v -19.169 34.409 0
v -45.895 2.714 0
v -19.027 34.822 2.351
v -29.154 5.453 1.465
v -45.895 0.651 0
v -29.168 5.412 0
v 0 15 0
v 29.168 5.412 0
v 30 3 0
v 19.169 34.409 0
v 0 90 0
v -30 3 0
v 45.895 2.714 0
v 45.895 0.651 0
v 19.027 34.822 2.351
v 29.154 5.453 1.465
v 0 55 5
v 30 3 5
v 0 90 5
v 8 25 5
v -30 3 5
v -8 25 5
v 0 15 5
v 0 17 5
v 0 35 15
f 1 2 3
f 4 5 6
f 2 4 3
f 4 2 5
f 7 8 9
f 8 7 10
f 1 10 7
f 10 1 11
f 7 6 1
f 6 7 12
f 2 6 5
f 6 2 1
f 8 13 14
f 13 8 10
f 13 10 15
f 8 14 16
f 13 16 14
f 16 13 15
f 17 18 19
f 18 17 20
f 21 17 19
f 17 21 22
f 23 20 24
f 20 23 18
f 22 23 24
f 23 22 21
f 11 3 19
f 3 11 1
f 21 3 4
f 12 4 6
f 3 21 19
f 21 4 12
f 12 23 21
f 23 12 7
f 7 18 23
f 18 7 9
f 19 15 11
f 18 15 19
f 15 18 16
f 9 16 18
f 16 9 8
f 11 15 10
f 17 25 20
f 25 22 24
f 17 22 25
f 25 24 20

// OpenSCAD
// cockpit_height
wing_span = 40; // [10:base_width * 2]
cockpit_height = 10; // [3:10]
base_width = 30; // [15:50]
base_length = 90;

module back_wing(solid) {
    difference() {
        rotate([0,-5,0]) {
            translate([-8,0,0]) {
            color([0,1,0])
            linear_extrude(height=4) polygon([[-wing_span,0],[-5,10],[2,50]]);
            }
        }
        translate([-50,0,-50]) cube([50,50,50]);
    }
}

back_wing();
mirror([1,0,0]) {
    back_wing();
}

linear_extrude(5)
polygon([[-base_width,3],[0,base_length],[base_width,3],[0,15]]);

translate([0,35,5]) {
    color([1,0,0]) polyhedron(
    points=[ [0,20,0],[8,-10,0],[0,-18,0],[-8,-10,0], // the four points at base
           [0,0,cockpit_height]  ],                                 // the apex point 
    faces=[ [0,1,4],[1,2,4],[2,3,4],[3,0,4],              // each triangle side
              [1,0,3],[2,1,3] ]                         // two triangles for square base
    );
}
